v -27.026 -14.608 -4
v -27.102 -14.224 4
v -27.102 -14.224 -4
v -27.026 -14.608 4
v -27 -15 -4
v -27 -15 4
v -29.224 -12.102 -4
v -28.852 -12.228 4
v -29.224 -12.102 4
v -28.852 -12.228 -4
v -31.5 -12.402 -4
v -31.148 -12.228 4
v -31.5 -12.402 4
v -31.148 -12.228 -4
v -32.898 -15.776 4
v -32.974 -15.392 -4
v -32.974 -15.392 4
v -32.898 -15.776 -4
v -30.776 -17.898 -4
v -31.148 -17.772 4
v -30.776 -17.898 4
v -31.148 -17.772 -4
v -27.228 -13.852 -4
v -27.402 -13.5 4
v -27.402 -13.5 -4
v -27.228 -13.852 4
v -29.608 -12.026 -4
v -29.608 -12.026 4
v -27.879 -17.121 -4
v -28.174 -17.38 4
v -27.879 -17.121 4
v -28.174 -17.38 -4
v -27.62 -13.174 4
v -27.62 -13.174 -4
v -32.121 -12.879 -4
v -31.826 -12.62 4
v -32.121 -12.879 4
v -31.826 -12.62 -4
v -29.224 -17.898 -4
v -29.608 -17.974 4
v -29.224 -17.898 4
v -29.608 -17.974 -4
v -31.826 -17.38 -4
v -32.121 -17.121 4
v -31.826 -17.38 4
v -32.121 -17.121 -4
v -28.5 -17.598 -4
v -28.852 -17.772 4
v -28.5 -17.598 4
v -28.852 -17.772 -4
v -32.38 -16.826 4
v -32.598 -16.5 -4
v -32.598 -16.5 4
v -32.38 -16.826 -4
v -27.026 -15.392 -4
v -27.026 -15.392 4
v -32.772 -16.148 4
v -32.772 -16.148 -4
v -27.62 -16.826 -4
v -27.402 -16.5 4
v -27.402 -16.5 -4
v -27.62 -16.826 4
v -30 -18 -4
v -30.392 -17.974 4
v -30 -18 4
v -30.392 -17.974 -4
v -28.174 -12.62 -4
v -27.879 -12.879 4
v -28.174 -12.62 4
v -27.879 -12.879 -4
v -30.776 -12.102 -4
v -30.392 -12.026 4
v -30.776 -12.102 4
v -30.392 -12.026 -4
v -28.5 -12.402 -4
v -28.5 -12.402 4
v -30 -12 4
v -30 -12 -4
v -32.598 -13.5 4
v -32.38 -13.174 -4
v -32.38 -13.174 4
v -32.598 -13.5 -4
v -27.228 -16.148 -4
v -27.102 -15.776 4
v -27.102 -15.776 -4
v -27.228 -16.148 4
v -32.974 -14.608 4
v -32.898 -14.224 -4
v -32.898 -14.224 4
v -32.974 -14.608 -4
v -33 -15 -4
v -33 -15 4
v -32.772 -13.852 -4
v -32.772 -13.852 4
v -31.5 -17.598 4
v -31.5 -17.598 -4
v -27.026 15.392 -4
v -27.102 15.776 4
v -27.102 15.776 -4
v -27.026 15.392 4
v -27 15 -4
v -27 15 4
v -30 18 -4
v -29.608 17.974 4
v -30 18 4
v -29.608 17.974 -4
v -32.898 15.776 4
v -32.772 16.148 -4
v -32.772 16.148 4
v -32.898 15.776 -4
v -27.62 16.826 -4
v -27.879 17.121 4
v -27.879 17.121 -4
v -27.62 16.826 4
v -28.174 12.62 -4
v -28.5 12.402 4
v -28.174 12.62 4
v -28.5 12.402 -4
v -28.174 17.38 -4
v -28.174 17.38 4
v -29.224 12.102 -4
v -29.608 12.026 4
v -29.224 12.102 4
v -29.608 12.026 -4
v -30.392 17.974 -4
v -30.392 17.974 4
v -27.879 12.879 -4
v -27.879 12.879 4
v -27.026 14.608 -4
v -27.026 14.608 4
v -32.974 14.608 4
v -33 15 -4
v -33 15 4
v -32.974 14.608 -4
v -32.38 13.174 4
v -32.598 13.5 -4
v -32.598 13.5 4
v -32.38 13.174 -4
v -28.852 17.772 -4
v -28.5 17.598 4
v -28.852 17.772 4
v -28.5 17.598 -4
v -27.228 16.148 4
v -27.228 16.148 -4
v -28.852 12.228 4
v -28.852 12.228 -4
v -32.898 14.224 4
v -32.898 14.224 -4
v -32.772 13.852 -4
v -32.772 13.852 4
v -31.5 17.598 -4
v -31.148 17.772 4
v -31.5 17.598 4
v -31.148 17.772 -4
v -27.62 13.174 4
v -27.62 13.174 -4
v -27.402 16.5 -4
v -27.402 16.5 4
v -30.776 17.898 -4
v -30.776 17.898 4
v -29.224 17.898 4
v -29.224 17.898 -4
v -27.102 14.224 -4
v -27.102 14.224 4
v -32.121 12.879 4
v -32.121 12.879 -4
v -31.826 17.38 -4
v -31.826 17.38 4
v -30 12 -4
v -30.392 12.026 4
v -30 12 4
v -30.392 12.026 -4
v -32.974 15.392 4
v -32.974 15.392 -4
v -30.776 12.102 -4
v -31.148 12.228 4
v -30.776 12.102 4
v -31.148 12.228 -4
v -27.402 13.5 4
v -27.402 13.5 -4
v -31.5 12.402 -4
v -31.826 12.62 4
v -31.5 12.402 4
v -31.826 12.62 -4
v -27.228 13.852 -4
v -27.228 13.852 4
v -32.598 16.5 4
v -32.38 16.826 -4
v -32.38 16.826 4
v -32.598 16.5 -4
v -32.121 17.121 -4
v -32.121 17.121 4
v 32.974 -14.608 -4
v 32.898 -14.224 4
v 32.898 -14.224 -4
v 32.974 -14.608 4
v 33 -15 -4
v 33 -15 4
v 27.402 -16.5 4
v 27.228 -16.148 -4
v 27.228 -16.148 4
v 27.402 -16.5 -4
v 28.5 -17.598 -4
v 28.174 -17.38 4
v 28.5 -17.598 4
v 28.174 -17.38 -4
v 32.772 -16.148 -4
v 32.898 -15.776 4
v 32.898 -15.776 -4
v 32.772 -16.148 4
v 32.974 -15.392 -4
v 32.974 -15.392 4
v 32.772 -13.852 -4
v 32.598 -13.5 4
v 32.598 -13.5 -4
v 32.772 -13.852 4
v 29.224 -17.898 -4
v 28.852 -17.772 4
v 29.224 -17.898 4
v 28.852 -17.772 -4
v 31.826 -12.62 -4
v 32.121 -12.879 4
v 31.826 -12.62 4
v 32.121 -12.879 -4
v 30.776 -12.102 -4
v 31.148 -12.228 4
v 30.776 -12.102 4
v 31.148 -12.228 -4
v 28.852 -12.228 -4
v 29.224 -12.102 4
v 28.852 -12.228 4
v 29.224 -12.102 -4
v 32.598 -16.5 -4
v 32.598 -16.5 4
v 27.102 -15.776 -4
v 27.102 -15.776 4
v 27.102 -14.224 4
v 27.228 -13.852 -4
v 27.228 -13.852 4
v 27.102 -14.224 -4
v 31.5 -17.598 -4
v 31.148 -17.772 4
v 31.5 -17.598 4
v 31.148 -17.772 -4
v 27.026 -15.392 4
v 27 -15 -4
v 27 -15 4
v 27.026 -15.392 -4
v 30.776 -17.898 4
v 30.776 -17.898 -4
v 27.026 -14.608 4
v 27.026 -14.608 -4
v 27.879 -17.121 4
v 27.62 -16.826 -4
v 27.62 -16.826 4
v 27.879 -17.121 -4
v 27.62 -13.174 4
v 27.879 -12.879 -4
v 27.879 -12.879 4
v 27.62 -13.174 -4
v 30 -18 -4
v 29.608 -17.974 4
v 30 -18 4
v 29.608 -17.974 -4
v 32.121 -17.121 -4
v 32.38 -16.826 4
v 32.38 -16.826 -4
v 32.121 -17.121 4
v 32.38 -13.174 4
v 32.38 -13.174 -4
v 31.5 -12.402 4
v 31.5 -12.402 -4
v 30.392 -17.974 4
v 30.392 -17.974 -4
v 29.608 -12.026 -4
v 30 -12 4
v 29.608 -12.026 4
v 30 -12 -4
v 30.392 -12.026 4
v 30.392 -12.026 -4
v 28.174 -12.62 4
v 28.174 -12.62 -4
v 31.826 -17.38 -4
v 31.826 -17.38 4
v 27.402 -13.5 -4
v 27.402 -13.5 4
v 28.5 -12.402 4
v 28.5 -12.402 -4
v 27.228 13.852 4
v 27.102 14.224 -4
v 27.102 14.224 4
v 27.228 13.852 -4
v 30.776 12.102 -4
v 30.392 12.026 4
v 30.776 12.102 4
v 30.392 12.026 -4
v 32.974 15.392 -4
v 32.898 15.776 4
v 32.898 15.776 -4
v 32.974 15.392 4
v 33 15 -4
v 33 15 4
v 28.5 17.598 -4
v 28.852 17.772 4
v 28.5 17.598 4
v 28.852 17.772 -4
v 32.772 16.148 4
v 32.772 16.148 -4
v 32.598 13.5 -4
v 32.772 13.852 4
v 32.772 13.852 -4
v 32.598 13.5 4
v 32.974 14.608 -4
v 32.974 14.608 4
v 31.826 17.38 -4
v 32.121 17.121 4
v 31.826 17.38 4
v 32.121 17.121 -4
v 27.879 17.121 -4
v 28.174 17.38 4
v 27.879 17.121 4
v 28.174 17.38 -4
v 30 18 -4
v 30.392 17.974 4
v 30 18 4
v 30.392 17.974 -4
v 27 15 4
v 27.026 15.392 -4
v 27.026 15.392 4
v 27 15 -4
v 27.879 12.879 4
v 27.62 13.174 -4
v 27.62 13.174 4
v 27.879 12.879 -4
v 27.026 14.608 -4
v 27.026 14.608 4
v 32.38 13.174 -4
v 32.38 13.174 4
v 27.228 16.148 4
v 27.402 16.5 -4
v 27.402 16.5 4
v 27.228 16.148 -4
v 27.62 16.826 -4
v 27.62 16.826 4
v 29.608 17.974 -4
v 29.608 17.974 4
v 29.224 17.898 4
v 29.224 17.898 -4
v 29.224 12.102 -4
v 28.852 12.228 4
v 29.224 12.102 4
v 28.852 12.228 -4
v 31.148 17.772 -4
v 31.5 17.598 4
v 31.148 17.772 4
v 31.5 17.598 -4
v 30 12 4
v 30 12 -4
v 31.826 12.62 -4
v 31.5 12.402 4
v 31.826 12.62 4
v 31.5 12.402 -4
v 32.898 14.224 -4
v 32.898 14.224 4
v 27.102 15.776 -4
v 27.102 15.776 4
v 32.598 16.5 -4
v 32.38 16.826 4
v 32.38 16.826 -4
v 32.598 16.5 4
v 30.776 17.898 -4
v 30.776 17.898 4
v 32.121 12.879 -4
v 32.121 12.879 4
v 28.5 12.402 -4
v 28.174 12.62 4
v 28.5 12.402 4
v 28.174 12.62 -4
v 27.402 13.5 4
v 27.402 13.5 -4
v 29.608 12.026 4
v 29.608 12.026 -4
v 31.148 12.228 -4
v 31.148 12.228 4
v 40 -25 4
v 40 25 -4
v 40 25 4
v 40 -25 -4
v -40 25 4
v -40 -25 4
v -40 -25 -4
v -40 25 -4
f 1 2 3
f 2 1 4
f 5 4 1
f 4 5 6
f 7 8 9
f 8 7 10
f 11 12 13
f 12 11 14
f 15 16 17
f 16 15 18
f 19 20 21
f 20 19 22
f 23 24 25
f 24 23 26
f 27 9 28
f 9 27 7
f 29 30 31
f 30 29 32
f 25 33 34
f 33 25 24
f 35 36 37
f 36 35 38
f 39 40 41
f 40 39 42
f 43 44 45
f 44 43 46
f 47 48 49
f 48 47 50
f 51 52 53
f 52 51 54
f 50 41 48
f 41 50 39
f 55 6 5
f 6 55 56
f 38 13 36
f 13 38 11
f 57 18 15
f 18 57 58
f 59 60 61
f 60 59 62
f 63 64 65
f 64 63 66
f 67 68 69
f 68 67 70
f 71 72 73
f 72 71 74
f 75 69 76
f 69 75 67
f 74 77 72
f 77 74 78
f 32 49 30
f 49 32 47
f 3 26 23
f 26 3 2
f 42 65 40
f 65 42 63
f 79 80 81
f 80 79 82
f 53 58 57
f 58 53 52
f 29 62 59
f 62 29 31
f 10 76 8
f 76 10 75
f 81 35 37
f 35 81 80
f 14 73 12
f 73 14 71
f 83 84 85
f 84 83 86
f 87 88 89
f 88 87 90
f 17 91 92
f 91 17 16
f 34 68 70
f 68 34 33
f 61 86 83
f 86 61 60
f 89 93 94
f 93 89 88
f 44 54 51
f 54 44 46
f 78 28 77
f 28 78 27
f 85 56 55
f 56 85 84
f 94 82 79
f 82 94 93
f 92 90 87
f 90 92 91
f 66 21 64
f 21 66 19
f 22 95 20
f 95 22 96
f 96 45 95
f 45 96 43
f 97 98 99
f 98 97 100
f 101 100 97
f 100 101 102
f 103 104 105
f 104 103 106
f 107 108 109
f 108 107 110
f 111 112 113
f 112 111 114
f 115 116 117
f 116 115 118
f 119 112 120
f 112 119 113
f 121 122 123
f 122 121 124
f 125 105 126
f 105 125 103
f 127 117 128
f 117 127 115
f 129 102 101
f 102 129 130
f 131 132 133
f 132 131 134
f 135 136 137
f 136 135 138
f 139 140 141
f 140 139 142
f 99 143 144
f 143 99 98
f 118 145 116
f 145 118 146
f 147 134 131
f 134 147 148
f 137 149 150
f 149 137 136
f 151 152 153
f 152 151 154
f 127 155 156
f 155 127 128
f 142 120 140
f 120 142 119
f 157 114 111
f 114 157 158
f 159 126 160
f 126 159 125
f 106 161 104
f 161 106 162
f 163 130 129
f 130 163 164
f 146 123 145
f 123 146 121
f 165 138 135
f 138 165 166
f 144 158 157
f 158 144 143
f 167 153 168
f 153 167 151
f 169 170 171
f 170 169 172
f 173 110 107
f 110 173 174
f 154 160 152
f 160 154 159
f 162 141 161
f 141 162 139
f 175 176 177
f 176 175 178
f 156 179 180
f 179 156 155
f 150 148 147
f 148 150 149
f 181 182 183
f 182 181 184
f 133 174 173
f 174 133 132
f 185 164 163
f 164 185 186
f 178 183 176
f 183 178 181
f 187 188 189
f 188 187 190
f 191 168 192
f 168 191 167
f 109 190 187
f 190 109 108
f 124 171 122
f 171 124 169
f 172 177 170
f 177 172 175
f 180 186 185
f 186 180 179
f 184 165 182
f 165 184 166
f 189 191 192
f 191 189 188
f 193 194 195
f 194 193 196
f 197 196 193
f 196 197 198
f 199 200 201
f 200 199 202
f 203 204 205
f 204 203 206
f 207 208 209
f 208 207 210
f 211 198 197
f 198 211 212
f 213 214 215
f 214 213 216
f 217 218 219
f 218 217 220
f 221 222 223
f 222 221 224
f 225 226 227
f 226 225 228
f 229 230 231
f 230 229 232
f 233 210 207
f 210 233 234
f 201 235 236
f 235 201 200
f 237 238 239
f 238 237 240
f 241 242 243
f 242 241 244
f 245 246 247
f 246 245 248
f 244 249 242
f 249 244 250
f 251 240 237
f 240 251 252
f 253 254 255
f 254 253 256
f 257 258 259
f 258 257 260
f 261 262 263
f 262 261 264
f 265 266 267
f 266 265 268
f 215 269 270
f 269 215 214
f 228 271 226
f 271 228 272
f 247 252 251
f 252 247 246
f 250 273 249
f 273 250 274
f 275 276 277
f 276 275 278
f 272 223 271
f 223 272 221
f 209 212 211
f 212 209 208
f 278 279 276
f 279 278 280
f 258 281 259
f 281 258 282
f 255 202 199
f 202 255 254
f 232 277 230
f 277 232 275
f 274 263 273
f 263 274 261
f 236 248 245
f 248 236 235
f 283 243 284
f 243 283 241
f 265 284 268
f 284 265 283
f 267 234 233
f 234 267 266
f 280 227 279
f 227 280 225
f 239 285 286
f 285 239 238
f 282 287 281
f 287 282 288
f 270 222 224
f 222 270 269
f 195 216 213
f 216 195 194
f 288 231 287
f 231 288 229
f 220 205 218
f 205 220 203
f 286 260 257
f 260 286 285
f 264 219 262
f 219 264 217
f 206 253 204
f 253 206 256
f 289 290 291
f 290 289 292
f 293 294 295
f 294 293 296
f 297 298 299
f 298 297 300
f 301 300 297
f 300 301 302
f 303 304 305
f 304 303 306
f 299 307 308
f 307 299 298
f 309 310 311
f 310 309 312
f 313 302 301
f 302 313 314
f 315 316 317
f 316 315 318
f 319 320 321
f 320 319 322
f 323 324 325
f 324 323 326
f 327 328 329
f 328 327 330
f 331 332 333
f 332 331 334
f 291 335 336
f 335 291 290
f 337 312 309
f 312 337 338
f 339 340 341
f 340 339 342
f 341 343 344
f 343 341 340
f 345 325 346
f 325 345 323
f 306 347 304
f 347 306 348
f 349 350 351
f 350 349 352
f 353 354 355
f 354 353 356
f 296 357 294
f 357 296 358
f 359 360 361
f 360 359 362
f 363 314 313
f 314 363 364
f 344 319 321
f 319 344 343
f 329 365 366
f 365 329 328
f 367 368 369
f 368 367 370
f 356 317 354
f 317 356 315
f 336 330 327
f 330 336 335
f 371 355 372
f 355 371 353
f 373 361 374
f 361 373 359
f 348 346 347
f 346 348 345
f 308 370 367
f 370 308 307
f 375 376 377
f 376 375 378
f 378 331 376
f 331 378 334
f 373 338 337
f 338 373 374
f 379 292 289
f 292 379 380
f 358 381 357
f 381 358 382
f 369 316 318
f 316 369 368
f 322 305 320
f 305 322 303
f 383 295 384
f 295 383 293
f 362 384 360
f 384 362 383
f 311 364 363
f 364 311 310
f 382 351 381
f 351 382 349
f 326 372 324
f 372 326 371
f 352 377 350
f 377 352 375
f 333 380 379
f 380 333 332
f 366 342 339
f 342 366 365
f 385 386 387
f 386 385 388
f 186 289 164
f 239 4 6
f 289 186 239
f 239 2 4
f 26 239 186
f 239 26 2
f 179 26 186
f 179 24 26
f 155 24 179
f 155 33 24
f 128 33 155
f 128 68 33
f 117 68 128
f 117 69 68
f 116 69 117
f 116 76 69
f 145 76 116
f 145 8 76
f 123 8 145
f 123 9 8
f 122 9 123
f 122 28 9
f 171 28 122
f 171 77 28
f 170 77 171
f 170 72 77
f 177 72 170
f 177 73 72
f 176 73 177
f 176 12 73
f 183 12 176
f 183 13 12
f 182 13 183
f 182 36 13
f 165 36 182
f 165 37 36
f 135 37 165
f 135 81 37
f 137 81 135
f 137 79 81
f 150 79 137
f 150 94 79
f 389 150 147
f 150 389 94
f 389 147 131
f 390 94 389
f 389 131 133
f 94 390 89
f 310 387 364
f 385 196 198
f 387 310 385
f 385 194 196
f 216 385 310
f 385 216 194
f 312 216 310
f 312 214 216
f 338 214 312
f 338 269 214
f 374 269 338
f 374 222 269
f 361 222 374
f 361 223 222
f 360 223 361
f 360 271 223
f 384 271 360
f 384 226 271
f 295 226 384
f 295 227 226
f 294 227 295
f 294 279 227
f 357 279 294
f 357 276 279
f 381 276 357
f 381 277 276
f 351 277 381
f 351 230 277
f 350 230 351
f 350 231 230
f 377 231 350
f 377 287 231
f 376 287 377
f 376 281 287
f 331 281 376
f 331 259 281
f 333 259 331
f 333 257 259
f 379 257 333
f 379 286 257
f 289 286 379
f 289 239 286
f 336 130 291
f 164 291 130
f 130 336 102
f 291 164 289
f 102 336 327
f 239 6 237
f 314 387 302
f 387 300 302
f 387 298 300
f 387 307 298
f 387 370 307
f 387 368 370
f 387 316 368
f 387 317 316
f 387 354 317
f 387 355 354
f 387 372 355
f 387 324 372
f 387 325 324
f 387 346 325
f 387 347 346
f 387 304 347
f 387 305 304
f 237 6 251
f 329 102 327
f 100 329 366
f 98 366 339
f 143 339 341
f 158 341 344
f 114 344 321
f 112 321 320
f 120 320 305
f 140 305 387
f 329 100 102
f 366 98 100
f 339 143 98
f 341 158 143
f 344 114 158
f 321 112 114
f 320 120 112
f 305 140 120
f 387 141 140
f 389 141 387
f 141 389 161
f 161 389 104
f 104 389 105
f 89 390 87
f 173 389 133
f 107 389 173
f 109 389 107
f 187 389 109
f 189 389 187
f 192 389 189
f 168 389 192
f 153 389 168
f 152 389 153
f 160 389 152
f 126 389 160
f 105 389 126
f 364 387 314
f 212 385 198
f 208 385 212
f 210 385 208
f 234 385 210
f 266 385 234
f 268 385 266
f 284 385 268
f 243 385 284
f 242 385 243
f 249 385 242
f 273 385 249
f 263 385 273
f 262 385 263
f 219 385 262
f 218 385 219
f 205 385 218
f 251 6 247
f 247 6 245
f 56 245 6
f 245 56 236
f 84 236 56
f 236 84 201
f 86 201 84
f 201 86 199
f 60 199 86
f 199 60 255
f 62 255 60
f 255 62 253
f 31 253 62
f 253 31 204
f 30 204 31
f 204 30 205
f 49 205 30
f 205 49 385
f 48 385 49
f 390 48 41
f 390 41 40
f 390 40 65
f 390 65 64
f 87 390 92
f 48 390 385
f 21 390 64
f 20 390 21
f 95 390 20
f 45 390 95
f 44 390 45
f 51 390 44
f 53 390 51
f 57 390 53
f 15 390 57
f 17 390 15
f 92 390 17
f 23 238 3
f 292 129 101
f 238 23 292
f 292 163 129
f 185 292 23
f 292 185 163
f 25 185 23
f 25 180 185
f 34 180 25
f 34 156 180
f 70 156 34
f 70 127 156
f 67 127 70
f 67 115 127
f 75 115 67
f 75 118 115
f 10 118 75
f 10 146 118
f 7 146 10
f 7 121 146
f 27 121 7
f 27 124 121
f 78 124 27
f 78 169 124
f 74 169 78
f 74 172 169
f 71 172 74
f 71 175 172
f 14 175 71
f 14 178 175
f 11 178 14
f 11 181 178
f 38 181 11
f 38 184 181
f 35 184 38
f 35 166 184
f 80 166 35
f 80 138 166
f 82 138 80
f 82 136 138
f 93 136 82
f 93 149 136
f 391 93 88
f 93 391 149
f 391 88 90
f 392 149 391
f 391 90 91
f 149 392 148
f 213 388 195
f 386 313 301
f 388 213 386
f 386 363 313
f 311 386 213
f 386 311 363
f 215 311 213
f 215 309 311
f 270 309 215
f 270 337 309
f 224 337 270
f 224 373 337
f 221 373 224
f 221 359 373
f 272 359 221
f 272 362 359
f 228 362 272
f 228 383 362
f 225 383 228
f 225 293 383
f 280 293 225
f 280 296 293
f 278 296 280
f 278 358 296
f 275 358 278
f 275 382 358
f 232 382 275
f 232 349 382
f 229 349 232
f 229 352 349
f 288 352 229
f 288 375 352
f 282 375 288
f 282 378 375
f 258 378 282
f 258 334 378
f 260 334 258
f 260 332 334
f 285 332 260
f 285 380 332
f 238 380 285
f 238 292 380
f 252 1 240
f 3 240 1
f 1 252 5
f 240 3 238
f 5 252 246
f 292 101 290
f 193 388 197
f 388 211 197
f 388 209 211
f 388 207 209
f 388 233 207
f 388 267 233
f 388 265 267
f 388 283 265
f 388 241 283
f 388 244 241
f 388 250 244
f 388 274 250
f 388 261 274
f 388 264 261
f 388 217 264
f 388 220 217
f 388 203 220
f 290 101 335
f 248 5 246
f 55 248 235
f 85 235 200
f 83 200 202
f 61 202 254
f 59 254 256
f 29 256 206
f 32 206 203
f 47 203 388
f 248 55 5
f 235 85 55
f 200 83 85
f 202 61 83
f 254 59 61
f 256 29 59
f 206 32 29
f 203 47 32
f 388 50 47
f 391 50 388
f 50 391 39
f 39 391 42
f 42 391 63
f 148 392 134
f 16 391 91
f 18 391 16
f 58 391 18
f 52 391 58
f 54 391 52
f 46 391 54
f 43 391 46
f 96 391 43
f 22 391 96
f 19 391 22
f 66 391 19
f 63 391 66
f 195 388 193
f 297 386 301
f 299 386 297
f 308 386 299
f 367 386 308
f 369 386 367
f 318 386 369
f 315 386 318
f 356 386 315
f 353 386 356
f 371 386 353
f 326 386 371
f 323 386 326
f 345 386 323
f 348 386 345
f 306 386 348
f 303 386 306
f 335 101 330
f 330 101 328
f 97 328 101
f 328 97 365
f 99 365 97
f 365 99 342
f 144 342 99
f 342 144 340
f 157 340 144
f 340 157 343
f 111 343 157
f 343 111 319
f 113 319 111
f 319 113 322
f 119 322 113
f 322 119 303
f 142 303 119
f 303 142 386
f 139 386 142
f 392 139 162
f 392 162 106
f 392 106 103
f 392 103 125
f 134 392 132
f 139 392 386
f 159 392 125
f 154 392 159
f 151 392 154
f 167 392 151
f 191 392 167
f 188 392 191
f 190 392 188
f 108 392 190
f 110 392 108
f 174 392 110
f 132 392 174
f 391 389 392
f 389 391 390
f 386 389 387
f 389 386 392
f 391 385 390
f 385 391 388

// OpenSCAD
// Simple prismatic part with through-holes — a fair auto-drawing target.
$fn = 48;

plate_x = 80;
plate_y = 50;
plate_z = 8;
hole_d = 6;
margin = 10;

difference() {
    cube([plate_x, plate_y, plate_z], center = true);
    for (x = [-1, 1], y = [-1, 1])
        translate([
            x * (plate_x / 2 - margin),
            y * (plate_y / 2 - margin),
            0
        ])
            cylinder(h = plate_z + 2, d = hole_d, center = true);
}
